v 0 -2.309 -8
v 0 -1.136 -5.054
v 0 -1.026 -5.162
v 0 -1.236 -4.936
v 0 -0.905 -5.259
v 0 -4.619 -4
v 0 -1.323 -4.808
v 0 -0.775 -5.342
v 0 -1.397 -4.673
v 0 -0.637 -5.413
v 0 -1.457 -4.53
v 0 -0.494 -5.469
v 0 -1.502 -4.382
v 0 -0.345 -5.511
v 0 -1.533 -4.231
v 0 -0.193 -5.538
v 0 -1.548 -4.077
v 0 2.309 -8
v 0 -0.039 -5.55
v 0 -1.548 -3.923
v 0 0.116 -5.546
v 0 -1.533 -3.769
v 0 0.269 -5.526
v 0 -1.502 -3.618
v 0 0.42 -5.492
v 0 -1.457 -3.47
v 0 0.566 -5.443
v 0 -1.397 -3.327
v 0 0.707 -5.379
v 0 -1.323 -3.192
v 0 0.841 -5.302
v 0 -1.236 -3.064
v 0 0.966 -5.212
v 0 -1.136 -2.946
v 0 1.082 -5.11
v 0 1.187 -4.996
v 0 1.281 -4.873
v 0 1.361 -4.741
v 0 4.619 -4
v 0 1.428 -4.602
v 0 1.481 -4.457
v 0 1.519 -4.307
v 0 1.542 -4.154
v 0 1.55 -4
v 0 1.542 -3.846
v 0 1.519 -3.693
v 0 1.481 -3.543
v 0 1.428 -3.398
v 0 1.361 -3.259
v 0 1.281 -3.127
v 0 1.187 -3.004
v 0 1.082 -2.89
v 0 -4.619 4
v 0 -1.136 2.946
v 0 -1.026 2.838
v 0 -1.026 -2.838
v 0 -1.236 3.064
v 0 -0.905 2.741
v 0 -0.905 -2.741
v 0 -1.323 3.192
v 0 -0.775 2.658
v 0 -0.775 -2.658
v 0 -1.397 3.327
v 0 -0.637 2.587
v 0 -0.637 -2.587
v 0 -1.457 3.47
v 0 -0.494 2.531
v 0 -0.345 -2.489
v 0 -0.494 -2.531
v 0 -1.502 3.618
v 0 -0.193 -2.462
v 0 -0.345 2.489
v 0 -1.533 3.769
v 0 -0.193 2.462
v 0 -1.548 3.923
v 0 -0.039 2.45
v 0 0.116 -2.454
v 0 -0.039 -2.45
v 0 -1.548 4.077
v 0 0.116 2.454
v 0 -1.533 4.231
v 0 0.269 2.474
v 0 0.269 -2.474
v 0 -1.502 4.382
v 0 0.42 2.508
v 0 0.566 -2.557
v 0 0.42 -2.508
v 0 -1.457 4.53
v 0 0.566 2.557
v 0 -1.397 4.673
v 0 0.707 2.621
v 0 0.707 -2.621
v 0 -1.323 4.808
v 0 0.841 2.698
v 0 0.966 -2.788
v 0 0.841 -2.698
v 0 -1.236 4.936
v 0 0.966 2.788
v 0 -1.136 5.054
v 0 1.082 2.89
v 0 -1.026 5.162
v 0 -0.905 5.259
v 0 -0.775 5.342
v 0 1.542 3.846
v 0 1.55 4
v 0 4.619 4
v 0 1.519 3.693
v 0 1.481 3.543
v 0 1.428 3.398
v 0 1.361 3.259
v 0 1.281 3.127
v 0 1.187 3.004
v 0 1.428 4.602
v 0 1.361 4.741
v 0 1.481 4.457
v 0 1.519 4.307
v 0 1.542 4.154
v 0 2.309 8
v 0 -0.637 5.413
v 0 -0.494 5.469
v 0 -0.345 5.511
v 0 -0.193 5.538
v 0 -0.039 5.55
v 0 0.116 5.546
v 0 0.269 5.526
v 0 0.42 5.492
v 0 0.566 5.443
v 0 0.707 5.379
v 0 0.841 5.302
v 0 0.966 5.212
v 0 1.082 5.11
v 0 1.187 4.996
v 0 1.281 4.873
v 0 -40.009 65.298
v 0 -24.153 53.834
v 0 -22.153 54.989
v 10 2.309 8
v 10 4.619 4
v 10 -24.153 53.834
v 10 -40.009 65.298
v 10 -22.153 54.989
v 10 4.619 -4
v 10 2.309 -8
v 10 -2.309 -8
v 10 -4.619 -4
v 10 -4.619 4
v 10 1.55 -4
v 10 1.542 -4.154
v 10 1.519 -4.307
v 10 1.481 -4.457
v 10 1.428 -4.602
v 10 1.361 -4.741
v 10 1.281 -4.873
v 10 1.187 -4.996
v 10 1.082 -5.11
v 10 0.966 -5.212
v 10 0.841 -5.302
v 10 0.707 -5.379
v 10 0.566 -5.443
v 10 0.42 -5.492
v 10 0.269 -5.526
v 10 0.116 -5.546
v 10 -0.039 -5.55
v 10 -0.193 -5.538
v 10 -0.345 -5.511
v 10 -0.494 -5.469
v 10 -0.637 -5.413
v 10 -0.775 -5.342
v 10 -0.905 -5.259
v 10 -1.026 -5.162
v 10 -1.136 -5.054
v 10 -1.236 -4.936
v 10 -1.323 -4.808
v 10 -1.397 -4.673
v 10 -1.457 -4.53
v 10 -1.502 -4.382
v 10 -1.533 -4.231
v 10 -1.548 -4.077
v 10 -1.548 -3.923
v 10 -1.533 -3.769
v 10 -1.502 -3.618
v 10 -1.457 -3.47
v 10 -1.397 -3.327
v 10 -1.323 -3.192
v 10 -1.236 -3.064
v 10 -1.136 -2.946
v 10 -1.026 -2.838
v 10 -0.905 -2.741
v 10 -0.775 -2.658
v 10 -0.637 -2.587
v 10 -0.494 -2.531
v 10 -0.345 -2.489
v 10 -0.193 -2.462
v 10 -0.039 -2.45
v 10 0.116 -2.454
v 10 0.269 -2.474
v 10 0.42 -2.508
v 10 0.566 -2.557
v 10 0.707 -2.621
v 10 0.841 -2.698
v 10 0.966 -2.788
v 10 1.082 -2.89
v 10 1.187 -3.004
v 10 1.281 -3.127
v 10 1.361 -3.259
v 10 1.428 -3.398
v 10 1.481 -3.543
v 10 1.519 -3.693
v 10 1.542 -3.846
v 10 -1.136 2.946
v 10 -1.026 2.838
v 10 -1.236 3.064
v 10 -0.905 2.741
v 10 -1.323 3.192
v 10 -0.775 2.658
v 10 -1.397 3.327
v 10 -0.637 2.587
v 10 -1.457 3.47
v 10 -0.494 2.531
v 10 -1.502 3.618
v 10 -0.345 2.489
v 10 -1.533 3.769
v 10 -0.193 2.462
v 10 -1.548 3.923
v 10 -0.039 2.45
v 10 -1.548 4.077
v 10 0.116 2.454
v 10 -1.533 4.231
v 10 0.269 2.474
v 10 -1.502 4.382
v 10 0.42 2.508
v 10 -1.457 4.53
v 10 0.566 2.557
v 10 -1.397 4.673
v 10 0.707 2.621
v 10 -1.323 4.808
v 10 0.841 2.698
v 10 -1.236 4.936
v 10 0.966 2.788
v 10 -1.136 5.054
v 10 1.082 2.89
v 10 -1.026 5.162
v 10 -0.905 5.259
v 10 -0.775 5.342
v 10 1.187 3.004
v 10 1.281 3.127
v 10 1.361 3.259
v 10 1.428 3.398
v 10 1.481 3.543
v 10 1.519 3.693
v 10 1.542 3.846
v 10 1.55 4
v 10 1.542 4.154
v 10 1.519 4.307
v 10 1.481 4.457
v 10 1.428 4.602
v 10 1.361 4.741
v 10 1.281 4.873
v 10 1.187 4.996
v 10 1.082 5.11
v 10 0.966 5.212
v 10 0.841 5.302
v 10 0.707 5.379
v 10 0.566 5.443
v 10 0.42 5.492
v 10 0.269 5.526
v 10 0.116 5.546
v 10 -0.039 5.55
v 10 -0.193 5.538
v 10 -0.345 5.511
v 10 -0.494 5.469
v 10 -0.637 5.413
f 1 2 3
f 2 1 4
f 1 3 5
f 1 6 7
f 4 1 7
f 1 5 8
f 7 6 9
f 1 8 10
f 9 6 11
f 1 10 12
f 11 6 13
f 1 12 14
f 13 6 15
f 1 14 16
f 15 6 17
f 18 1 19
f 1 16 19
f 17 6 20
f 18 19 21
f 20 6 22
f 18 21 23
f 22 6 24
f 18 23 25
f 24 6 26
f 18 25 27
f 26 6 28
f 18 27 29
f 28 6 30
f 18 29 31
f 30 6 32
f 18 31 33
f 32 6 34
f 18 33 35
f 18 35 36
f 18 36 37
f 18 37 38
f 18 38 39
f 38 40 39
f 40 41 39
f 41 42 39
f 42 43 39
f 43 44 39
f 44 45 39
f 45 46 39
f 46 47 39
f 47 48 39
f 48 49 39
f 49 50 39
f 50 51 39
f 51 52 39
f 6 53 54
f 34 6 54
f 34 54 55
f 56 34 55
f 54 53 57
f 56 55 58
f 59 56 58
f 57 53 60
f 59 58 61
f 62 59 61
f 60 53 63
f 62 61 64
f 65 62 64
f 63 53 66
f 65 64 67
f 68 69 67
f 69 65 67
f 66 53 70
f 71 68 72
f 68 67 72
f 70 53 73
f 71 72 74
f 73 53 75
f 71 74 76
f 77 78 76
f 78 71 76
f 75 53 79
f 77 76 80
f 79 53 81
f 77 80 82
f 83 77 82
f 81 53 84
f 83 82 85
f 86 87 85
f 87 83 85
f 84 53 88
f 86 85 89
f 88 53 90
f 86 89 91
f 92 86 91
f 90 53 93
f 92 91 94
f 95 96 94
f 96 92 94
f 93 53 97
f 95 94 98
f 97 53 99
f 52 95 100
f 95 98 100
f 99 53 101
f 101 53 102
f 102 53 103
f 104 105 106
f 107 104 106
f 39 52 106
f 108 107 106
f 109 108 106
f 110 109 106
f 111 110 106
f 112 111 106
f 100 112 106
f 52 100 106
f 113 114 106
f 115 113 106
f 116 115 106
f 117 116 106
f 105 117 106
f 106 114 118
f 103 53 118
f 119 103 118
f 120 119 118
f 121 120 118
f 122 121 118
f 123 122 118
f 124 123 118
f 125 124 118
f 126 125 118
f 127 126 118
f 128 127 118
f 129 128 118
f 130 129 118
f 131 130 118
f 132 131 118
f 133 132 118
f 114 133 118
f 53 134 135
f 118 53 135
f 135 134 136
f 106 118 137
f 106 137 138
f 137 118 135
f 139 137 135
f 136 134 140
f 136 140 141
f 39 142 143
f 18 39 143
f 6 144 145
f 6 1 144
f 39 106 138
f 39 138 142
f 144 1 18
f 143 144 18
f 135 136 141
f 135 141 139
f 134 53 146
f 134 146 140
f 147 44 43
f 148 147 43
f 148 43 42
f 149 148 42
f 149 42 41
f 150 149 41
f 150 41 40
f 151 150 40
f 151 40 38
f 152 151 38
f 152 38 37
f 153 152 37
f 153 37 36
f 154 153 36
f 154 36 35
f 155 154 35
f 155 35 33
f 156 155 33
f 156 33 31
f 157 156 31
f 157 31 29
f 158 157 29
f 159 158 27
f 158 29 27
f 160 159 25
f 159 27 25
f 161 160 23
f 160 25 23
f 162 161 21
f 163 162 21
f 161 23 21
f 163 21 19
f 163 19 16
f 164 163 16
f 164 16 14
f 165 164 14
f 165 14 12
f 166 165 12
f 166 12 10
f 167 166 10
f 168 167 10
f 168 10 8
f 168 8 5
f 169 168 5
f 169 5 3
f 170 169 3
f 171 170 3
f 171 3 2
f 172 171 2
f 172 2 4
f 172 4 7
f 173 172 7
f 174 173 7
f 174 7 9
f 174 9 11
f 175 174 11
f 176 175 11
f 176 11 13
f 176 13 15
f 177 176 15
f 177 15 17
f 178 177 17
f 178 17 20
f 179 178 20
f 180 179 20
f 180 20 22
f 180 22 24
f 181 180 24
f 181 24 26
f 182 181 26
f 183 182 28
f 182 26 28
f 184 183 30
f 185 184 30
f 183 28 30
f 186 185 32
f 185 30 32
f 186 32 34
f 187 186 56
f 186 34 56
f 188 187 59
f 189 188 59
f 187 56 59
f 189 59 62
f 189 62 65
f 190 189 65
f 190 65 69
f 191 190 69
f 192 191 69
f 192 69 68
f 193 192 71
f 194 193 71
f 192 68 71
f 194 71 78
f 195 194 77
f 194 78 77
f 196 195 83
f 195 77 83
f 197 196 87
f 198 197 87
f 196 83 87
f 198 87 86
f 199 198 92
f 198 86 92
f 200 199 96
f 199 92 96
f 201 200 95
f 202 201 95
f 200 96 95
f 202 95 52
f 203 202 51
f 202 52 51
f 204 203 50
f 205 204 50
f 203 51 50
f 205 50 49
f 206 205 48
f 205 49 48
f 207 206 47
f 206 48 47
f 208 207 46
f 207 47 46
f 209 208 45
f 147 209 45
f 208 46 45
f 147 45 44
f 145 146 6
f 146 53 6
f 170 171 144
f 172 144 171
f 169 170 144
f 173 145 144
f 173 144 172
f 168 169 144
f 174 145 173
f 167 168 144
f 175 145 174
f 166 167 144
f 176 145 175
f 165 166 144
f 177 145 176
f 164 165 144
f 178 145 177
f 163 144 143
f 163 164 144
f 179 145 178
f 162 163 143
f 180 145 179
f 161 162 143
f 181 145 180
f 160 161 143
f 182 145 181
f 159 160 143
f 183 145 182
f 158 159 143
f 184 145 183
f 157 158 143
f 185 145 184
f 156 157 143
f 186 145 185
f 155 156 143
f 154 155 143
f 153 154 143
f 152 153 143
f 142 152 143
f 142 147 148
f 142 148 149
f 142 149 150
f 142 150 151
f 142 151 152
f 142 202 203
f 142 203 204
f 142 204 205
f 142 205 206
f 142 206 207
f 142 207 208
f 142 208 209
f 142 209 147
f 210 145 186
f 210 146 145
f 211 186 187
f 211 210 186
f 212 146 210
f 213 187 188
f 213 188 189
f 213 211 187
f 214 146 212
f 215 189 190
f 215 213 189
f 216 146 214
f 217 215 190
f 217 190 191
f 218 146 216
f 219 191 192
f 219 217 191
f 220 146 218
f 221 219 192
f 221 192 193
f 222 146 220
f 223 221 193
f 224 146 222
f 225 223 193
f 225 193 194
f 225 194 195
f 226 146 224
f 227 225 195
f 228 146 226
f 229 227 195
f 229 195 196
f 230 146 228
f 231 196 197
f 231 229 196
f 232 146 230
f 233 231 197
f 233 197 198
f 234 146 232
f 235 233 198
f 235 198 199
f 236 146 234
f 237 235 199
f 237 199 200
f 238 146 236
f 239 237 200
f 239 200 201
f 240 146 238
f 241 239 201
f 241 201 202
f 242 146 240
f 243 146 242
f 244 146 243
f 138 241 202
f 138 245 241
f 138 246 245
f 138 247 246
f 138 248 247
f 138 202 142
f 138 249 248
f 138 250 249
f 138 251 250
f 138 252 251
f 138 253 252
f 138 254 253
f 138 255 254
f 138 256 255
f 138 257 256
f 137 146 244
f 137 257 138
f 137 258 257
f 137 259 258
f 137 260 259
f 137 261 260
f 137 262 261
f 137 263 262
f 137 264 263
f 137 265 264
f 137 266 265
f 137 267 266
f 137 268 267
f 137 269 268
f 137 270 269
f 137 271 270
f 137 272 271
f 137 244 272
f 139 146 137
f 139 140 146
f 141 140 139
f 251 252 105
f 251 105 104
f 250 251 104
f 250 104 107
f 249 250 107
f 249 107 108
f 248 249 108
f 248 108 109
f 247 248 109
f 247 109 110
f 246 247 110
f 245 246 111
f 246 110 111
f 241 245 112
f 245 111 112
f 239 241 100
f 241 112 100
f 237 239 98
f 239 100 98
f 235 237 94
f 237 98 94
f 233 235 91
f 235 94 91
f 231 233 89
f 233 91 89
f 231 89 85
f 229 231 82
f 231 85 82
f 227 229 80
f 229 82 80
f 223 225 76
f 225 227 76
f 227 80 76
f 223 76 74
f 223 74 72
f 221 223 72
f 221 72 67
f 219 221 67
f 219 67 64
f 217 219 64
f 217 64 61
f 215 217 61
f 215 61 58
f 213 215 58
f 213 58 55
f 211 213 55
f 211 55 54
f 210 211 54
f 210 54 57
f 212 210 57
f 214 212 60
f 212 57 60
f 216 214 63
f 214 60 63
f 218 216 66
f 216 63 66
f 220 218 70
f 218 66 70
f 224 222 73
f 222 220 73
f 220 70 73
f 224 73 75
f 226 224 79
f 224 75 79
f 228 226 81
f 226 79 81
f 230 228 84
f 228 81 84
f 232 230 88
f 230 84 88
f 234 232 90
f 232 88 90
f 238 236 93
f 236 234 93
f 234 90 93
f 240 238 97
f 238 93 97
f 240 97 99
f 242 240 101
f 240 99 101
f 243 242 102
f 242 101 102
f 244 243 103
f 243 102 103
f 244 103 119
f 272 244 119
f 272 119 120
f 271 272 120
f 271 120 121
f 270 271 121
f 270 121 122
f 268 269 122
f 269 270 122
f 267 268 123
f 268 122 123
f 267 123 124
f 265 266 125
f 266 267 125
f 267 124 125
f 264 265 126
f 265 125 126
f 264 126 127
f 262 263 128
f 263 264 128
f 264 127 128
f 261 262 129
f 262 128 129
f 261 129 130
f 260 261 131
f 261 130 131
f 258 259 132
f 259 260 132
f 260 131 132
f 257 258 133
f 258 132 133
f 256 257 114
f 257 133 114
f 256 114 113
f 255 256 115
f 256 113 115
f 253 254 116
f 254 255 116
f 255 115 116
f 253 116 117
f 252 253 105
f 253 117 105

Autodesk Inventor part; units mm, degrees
ref_plane "YZ Plane" through (0, 0, 0) normal (1, 0, 0) x (0, 1, 0)
ref_plane "XZ Plane" through (0, 0, 0) normal (0, 1, 0) x (-1, 0, 0)
ref_plane "XY Plane" through (0, 0, 0) normal (0, 0, 1) x (1, 0, 0)
sketch "Sketch1" plane through (0, 0, 0) normal (1, 0, 0) x (0, 1, 0)
  line L0 (2.3094, 8) -> (-2.3094, 8)
  line L1 (-2.3094, 8) -> (-2.3094, -8)
  line L2 (-2.3094, -8) -> (2.3094, -8)
  line L3 (2.3094, -8) -> (2.3094, 8)
  line L4 (2.3094, 8) -> (-2.3094, -8) construction
  line L5 (-2.3094, 8) -> (2.3094, -8) construction
  line L6 (2.3094, 8) -> (-24.153, 53.8342)
  line L7 (2.3094, -8) -> (-2.3094, -8)
  line L8 (-2.3094, -8) -> (-4.6188, -4)
  line L9 (-4.6188, -4) -> (-2.3094, 0)
  line L10 (-2.3094, 0) -> (2.3094, 0)
  line L11 (2.3094, 0) -> (4.6188, -4)
  line L12 (4.6188, -4) -> (2.3094, -8)
  line L13 (0, -22.6597) -> (0, 79.958) projected
  line L14 (2.3094, 8) -> (4.6188, 4)
  line L15 (4.6188, 4) -> (2.3094, 0)
  line L16 (2.3094, 0) -> (-2.3094, 0)
  line L17 (-2.3094, 0) -> (-4.6188, 4)
  line L18 (-4.6188, 4) -> (-2.3094, 8)
  line L19 (-2.3094, 8) -> (2.3094, 8)
  line L20 (4.6188, 4) -> (4.6188, -4)
  line L21 (-4.6188, 4) -> (-4.6188, -4)
  circle A0 centre (0, -4) radius 1.55
  circle A1 centre (0, 4) radius 1.55
  line L22 (2.3094, 8) -> (2.3094, 5.0078)
  line L23 (-40.0094, 65.2983) -> (-22.153, 54.9889)
  line L24 (-22.153, 54.9889) -> (-24.153, 53.8342)
  line L25 (-4.6188, 4) -> (-40.0094, 65.2983)
  point P0 (0, 0)
  point P1 (2.3094, 8)
  point P2 (-3.4641, 6)
  point P3 (0, 8)
  point P4 (0, 12)
  dimension "d3" = 4.6188
  dimension "d4" = 16
  dimension "d15" = 8
  dimension "d16" = 8
  dimension "d18" = 3.1
  dimension "d19" = 3.1
  dimension "d20" = 4.6188
  dimension "d23" = 2
  dimension "d24" = 40.0094
  dimension "d25" = 60
  dimension "d26" = 30
  dimension "d27" = 73.2983
extrude "Extrusion2" add sketch "Sketch1" along normal blind 10 contours L3 L10 L13 A1 L0 | L14 L15 L3 | L0 L13 L6 | L13 A1 L10 L1 L0 | L0 L18 L25 L23 L24 L6 L13 | L20 L11 L15 | L1 L17 L18 | L11 L12 L3 | L3 L2 L13 A0 L10 | L10 L13 A0 L2 L1 | L1 L8 L9 | L9 L21 L17
equation "\"d3\" = FlipperArmThickness"
equation "\"d4\" = 2 * M3ScrewInsertBrim"
equation "\"d15\" = M3ScrewInsertBrim"
equation "\"d16\" = M3ScrewInsertBrim"
equation "\"d18\" = M3ScrewDia"
equation "\"d19\" = M3ScrewDia"
equation "\"d23\" = FlipperSpikeTipOffset"
equation "\"d24\" = FlipperSpikeDrop"
equation "\"d25\" = FlipperSpikeTipAngle"
equation "\"d26\" = FlipperSpikeAngle"
equation "\"d32\" = FlipperSpikeWidth"
equation "\"FlipperSpikeReach\" = d27 - 0.433013 * BodyHeight"
equation "\"FlipperSpikeTipAngle\" = 60deg"
equation "\"FlipperSpikeTipOffset\" = 2"
equation "\"FlipperArmThickness\" = 4.618802"
equation "\"M3ScrewInsertBrim\" = 8"
equation "\"M3ScrewDia\" = 3.1"
equation "\"FlipperSpikeDrop\" = 40.009401"
equation "\"FlipperSpikeAngle\" = 30deg"
equation "\"FlipperSpikeWidth\" = 10"
equation "\"BodyHeight\" = 30"
properties part number "HexFlipperSpike" material "H TPU"
